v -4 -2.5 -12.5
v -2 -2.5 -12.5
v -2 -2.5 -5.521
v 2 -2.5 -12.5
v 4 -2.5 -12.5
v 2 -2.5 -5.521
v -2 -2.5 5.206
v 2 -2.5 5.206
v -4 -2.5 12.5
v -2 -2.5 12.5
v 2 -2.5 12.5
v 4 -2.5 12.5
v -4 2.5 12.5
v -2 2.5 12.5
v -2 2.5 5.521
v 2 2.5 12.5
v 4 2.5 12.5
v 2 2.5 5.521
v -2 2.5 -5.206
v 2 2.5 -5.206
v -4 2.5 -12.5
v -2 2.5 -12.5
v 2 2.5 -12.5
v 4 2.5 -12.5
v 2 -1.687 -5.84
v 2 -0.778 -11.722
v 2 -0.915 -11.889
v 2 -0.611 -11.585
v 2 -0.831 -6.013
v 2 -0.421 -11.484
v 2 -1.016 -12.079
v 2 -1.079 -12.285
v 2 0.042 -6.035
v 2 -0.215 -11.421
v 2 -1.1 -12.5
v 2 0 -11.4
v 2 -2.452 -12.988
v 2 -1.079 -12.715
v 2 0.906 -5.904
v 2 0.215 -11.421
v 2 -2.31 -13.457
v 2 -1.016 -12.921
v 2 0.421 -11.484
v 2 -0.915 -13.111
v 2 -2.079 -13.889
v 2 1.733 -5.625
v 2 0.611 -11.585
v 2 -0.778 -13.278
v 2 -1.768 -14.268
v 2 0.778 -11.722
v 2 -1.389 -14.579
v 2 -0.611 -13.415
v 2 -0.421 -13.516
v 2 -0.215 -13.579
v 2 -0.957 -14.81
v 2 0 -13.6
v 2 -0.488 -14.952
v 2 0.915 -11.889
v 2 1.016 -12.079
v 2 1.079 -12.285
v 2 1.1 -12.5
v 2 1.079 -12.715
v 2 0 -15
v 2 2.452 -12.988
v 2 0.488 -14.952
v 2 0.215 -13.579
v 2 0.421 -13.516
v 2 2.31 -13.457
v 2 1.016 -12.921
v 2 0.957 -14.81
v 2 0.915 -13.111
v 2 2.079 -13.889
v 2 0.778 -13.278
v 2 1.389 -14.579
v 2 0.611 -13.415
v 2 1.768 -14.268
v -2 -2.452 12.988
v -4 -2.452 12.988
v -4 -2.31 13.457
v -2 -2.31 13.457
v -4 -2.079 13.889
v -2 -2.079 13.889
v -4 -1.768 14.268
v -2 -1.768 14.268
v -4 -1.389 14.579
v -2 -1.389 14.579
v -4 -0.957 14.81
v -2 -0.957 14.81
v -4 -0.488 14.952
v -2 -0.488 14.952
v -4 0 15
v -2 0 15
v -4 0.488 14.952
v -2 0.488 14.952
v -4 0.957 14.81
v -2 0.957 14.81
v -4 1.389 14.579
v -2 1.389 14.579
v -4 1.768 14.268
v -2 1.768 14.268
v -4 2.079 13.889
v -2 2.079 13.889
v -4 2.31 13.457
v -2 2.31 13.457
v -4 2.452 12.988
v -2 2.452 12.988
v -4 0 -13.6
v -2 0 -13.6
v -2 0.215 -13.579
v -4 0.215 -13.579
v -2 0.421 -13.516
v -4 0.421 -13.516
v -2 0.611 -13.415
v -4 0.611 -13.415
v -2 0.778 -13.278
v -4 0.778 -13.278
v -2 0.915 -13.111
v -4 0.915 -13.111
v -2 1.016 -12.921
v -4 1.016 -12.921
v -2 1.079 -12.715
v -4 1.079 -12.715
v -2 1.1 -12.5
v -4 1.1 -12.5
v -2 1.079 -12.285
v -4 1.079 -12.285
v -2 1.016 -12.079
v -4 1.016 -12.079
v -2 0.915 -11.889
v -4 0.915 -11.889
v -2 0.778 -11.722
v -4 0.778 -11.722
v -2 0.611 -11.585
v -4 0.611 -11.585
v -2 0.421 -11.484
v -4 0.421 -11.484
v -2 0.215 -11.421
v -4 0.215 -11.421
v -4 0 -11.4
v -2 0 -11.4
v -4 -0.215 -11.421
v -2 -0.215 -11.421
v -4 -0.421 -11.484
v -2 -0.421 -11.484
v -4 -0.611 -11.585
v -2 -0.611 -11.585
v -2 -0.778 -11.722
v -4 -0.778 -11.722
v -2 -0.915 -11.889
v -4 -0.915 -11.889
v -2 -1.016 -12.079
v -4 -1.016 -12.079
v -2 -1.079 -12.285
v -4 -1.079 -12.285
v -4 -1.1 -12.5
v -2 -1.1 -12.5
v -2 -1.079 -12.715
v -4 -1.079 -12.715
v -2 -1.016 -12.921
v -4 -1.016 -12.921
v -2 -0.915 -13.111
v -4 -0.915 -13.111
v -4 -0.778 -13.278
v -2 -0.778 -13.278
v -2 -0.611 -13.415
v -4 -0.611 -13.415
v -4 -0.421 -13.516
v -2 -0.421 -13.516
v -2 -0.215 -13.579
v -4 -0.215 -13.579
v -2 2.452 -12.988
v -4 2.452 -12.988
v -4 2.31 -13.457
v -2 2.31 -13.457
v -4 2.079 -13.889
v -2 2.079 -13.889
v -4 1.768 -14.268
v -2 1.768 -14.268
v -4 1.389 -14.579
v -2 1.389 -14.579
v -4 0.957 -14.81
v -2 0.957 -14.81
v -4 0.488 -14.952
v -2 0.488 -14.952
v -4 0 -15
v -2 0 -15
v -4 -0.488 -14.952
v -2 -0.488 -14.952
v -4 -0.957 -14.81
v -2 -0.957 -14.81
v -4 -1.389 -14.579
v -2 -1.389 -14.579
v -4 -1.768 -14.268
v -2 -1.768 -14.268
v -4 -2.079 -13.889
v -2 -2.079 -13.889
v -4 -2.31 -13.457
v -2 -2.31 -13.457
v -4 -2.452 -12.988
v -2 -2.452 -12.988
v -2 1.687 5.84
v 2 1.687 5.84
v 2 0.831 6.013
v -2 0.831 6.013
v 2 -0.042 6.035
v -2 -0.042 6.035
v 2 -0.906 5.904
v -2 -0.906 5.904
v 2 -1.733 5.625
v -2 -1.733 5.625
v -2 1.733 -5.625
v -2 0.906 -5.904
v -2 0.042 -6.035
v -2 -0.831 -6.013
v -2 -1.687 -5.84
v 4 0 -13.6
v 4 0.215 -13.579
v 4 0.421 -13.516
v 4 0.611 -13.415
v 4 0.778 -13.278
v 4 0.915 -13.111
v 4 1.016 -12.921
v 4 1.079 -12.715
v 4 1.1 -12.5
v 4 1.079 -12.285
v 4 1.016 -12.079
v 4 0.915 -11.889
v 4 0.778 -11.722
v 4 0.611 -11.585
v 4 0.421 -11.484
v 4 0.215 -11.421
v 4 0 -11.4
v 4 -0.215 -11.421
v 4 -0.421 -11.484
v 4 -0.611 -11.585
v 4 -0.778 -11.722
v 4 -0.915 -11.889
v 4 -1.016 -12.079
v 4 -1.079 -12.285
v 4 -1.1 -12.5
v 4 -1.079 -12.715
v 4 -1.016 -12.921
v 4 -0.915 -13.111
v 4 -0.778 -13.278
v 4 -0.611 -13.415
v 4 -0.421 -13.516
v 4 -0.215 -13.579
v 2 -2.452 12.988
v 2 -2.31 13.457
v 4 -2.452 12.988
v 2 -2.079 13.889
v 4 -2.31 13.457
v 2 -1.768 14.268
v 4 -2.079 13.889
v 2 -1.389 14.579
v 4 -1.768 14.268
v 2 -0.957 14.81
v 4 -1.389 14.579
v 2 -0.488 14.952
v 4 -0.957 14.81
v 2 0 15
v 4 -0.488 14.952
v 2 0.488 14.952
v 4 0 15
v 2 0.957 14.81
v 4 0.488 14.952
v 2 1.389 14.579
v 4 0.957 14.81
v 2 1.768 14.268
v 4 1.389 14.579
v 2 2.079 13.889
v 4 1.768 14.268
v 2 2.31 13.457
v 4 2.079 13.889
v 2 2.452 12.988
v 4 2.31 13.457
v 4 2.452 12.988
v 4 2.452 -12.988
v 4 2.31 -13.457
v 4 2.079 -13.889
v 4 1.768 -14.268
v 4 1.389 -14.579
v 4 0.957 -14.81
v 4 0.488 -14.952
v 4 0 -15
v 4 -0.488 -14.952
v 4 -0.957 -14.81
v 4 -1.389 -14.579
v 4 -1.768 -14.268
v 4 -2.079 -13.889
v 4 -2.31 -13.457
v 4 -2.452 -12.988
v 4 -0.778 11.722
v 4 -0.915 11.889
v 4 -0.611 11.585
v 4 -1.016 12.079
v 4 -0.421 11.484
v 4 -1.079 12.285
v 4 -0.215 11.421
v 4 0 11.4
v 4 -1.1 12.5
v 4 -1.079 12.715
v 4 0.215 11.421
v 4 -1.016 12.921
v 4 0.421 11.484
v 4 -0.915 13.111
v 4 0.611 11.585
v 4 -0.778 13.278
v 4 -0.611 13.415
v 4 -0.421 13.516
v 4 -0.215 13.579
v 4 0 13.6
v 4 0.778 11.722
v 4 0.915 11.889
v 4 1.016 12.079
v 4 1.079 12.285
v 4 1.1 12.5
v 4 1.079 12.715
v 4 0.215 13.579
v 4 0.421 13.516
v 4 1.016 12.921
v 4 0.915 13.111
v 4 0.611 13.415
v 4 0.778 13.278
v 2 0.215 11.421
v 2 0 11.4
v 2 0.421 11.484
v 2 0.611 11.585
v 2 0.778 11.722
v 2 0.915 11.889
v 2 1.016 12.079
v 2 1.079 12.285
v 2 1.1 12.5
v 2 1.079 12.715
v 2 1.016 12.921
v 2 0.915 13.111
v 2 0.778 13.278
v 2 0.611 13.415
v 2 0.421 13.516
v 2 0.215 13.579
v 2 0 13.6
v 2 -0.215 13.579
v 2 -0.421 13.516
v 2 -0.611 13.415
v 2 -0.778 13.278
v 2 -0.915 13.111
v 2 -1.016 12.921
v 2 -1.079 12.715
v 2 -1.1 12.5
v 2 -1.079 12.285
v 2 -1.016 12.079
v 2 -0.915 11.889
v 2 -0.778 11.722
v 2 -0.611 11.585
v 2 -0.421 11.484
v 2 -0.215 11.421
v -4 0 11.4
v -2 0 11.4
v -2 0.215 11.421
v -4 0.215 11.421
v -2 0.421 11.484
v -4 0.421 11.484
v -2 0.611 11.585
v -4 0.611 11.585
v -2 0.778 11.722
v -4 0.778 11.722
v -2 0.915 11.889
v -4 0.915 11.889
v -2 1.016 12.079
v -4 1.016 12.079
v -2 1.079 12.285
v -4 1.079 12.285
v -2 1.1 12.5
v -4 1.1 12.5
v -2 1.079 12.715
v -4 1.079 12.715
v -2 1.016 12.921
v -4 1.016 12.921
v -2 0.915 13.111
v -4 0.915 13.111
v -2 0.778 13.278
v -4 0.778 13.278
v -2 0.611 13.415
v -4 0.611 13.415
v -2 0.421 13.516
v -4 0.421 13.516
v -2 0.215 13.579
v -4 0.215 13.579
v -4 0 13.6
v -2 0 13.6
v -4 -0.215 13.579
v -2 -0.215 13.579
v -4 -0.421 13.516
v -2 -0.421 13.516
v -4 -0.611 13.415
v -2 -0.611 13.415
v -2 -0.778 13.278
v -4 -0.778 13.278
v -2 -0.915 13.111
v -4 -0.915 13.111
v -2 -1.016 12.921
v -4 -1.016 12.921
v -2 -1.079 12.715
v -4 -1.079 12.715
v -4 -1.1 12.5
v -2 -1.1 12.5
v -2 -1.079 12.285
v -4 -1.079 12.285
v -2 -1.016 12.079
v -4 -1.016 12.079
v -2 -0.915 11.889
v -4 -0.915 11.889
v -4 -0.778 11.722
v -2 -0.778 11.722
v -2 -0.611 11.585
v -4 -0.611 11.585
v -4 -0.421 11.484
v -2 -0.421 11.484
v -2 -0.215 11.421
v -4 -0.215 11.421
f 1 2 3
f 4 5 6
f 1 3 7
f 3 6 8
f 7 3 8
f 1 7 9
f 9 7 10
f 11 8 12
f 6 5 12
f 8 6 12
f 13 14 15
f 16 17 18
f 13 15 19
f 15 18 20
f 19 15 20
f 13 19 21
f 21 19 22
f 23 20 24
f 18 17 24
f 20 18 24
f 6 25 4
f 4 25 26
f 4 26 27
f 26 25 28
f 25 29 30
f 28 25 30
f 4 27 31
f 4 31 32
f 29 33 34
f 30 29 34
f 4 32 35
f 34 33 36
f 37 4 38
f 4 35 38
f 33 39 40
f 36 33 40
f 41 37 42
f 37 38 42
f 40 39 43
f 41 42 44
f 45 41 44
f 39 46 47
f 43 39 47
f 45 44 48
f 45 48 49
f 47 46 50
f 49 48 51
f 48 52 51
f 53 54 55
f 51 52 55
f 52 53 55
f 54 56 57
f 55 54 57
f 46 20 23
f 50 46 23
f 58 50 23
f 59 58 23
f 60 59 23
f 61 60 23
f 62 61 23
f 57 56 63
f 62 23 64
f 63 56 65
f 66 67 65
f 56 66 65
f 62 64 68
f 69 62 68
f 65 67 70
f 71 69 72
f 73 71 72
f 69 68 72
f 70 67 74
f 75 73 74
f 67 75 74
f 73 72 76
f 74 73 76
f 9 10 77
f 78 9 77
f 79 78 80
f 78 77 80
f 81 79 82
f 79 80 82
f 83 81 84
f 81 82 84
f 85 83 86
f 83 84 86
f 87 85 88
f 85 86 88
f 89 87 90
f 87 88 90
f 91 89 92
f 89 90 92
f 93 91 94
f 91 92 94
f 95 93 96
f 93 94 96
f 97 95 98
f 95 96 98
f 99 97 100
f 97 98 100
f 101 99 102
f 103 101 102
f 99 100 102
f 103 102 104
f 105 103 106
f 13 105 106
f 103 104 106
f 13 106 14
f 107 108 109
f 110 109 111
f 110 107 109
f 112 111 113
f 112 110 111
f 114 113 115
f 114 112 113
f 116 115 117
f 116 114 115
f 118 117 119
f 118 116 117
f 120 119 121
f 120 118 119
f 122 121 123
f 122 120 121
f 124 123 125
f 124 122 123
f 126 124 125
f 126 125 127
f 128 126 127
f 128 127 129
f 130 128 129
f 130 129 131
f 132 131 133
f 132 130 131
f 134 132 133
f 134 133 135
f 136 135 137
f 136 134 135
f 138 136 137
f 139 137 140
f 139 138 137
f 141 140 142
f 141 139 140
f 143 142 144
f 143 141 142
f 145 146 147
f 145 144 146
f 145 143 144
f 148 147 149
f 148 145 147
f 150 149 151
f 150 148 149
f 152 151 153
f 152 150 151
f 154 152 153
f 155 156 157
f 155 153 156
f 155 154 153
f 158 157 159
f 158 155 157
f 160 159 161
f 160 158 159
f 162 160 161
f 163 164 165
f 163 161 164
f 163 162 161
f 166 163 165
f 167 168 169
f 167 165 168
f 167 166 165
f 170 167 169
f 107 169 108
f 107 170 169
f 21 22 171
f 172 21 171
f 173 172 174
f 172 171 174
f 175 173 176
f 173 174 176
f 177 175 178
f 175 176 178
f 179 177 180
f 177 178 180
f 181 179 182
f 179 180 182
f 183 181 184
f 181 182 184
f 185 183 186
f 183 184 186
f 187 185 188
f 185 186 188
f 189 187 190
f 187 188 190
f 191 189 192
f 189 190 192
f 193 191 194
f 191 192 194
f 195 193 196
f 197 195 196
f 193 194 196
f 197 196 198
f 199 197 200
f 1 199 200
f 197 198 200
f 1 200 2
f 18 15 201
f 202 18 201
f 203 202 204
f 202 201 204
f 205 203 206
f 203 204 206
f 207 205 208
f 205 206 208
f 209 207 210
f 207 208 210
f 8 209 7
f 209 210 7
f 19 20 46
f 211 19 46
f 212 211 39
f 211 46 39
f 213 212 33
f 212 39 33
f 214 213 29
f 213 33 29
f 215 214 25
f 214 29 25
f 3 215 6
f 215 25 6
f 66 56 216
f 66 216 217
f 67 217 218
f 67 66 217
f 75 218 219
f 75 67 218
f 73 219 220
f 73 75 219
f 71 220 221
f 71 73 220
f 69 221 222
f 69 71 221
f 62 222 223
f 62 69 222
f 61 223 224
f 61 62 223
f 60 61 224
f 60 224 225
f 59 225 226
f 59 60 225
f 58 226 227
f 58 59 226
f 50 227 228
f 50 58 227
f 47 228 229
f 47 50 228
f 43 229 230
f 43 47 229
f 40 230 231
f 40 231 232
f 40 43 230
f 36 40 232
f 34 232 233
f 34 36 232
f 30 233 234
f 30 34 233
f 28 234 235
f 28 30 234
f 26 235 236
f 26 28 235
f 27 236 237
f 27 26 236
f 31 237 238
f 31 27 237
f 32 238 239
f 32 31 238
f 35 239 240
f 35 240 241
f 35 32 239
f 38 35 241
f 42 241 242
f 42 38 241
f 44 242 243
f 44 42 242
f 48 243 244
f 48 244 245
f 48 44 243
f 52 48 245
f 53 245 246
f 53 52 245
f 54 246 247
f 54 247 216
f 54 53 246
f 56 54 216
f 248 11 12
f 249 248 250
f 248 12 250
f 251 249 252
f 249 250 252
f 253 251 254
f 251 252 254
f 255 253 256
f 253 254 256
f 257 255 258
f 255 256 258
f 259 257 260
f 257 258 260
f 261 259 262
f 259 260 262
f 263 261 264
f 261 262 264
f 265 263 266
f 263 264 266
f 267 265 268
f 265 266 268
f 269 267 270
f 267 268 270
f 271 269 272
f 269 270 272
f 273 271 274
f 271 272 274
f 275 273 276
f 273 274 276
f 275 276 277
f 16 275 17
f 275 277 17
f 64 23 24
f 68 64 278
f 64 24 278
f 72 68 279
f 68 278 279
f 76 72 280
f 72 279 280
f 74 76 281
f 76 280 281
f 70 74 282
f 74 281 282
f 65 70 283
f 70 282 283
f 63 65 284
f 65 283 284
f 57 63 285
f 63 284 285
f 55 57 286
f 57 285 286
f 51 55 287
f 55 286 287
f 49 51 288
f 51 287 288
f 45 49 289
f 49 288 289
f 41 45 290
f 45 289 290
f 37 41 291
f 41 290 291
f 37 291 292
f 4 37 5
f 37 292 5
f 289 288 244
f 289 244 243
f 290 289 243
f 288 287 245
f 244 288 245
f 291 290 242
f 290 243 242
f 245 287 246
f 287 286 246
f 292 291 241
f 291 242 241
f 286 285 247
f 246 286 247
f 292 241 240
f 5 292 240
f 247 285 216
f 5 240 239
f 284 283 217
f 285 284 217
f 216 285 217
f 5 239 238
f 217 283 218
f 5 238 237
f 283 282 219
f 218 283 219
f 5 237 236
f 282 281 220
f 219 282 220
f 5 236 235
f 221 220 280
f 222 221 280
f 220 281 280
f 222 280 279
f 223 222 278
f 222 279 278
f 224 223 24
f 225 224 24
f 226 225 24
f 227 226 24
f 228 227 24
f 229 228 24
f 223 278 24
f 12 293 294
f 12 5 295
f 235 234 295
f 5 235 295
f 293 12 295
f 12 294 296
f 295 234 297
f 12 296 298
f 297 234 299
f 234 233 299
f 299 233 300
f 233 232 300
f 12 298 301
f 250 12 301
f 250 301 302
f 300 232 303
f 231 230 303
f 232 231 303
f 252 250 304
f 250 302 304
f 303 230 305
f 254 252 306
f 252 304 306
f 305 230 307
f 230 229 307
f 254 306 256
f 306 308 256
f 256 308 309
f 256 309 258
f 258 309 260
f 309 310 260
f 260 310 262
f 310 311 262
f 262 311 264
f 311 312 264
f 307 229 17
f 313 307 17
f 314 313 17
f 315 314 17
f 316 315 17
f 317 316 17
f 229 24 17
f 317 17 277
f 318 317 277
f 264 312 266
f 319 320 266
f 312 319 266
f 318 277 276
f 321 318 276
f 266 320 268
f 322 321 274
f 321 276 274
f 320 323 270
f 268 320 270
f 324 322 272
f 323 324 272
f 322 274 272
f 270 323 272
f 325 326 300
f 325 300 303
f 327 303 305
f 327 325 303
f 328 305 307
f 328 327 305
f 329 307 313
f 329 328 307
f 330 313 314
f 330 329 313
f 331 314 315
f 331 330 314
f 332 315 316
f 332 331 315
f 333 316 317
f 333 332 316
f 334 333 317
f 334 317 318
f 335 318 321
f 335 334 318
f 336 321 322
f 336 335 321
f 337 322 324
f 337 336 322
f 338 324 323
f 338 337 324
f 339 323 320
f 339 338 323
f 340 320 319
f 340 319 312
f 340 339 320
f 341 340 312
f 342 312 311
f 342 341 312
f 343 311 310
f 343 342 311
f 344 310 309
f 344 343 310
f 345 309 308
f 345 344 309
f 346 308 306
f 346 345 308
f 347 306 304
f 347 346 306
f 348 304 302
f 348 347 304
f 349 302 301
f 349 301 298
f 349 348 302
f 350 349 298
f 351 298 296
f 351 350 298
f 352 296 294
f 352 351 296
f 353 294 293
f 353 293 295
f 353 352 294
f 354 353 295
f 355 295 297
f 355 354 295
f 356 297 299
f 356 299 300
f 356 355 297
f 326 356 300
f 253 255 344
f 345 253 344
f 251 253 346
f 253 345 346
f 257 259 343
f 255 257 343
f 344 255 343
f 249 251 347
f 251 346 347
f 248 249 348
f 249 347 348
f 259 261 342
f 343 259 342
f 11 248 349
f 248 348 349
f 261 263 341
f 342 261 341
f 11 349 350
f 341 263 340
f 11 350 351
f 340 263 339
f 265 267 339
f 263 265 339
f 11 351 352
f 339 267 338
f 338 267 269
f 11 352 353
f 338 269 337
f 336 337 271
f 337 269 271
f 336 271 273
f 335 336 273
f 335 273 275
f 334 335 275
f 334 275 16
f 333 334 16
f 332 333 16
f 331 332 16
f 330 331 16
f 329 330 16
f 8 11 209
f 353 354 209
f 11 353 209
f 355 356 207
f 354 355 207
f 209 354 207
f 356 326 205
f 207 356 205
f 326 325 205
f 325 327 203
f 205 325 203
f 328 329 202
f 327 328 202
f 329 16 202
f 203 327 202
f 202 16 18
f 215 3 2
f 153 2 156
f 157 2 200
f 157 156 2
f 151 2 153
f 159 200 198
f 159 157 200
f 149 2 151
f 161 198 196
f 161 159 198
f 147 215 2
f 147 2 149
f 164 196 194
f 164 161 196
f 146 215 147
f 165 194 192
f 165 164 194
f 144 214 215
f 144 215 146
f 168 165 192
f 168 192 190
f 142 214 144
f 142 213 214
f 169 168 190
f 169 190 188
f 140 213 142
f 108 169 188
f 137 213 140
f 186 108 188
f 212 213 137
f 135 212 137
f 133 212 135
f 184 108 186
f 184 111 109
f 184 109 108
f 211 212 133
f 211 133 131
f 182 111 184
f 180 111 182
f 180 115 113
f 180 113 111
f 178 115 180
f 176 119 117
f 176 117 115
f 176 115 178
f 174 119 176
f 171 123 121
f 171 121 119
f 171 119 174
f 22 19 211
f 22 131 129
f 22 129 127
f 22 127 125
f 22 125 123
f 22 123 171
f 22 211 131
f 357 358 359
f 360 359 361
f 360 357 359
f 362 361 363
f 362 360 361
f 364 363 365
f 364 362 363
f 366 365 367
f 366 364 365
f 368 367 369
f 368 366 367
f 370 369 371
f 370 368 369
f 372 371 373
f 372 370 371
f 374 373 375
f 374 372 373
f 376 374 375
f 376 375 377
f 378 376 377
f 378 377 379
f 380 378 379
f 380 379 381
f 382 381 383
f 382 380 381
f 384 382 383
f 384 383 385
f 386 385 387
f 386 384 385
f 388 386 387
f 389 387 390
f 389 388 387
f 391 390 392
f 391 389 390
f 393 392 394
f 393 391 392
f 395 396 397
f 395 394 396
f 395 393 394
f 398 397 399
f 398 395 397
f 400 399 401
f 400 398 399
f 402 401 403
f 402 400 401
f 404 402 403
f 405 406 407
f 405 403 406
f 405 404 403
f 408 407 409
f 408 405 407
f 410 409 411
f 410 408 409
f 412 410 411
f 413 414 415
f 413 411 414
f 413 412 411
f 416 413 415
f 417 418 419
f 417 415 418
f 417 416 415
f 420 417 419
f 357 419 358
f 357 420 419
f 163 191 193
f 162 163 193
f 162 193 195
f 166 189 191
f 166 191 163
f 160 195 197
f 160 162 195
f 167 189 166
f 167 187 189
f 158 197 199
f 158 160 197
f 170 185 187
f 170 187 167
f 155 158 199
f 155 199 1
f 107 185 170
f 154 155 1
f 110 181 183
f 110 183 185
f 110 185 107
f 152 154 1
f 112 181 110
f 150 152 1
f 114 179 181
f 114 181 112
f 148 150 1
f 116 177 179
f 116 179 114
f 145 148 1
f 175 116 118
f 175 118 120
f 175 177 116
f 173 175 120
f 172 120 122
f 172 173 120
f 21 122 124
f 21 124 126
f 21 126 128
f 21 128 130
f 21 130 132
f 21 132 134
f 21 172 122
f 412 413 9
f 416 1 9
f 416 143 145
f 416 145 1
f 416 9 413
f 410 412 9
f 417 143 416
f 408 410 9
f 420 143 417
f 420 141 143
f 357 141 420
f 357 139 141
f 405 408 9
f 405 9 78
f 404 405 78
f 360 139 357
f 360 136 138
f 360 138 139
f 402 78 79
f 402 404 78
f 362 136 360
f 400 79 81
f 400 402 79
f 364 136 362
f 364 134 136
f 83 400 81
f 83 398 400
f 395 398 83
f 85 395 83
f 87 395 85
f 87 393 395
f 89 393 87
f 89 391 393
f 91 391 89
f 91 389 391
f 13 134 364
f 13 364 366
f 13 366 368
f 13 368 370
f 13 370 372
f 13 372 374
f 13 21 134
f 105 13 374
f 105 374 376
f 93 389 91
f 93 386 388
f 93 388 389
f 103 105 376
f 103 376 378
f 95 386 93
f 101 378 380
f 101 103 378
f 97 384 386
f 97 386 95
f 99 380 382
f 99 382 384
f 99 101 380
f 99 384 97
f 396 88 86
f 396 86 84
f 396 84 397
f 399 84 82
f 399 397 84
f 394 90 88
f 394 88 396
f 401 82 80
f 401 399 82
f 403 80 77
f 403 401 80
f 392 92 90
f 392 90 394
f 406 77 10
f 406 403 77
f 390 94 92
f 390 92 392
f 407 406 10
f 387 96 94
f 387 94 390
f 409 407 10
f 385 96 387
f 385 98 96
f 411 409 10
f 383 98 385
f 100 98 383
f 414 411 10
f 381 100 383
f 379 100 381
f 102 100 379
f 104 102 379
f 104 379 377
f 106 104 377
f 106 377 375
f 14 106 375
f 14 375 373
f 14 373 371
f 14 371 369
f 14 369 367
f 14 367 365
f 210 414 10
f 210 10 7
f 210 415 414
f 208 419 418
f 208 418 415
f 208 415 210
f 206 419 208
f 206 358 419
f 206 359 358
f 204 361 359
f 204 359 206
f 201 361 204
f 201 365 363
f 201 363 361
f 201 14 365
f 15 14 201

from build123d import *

# Parameters (mm, degrees)
SKETCH_1_R          = 1.1
EXTRUDE_1_DEPTH     = 4
SKETCH_2_R          = 4
CUT_EXTRUDE_1_DEPTH = 2
FILLET_1_R          = 5


with BuildPart() as part:
    # 草图1 → 凸台-拉伸1 (new, symmetric)
    with BuildSketch(Plane(origin=(0, 0, 0), x_dir=(0, 0, -1), z_dir=(1, 0, 0))):
        with BuildLine():
            Line((-12.5, 2.5), (12.5, 2.5))
            ThreePointArc((12.5, 2.5), (15, 0), (12.5, -2.5))
            Line((12.5, -2.5), (-12.5, -2.5))
            ThreePointArc((-12.5, -2.5), (-15, 0), (-12.5, 2.5))
        make_face()
        with Locations((12.5, 0)):
            Circle(SKETCH_1_R, mode=Mode.SUBTRACT)
        with Locations((-12.5, 0)):
            Circle(SKETCH_1_R, mode=Mode.SUBTRACT)
    extrude(amount=EXTRUDE_1_DEPTH, both=True)

    # 草图2 → 切除-拉伸1 (cut, symmetric)
    with BuildSketch(Plane(origin=(0, 0, 0), x_dir=(0, 0, -1), z_dir=(1, 0, 0))):
        with BuildLine():
            ThreePointArc((-9.377501001, 2.5), (-8.725745372, 1.324764885), (-8.5, 0))
            Line((-8.5, 0), (-5.520616019, 2.5))
            Line((-5.520616019, 2.5), (-9.377501001, 2.5))
        make_face()
        with BuildLine():
            Line((-5.520616019, -2.5), (-8.5, 0))
            ThreePointArc((-8.5, 0), (-8.725745372, -1.324764885), (-9.377501001, -2.5))
            Line((-9.377501001, -2.5), (-5.520616019, -2.5))
        make_face()
        with Locations((-12.5, 0)):
            Circle(SKETCH_2_R)
        with Locations((12.5, 0)):
            Circle(SKETCH_2_R)
        with BuildLine():
            Line((9.377501001, 2.5), (5.520616019, 2.5))
            Line((5.520616019, 2.5), (8.5, 0))
            ThreePointArc((8.5, 0), (8.725745372, 1.324764885), (9.377501001, 2.5))
        make_face()
        with BuildLine():
            ThreePointArc((9.377501001, -2.5), (8.725745372, -1.324764885), (8.5, 0))
            Line((8.5, 0), (5.520616019, -2.5))
            Line((5.520616019, -2.5), (9.377501001, -2.5))
        make_face()
    extrude(amount=CUT_EXTRUDE_1_DEPTH, both=True, mode=Mode.SUBTRACT)

    # 圆角1
    # the kernel refuses this fillet: 5 mm, written as the material it takes off along each edge
    with BuildSketch(Plane(origin=(2, 0, -8.5), x_dir=(0, -0.6427876096865346, 0.766044443118982), z_dir=(-1, 0, 0))) as fillet_1_piece_1:
        with BuildLine():
            CenterArc((5.885460651, 4.584253576), FILLET_1_R, 170, 76.469935568)
            Line((0.961421886, 5.452494464), (0, 0))
            Line((0, 0), (3.889309567, 0))
        make_face()
    extrude(amount=4, mode=Mode.SUBTRACT)
    with BuildSketch(Plane(origin=(-2, 0, 8.5), x_dir=(0, -0.6427876096865349, -0.7660444431189818), z_dir=(1, 0, 0))) as fillet_1_piece_2:
        with BuildLine():
            CenterArc((5.53660798, 5), FILLET_1_R, 193.530064432, 76.469935568)
            Line((0.675371519, 3.830222216), (0, 0))
            Line((0, 0), (5.53660798, 0))
        make_face()
    extrude(amount=4, mode=Mode.SUBTRACT)


solid = part.part
